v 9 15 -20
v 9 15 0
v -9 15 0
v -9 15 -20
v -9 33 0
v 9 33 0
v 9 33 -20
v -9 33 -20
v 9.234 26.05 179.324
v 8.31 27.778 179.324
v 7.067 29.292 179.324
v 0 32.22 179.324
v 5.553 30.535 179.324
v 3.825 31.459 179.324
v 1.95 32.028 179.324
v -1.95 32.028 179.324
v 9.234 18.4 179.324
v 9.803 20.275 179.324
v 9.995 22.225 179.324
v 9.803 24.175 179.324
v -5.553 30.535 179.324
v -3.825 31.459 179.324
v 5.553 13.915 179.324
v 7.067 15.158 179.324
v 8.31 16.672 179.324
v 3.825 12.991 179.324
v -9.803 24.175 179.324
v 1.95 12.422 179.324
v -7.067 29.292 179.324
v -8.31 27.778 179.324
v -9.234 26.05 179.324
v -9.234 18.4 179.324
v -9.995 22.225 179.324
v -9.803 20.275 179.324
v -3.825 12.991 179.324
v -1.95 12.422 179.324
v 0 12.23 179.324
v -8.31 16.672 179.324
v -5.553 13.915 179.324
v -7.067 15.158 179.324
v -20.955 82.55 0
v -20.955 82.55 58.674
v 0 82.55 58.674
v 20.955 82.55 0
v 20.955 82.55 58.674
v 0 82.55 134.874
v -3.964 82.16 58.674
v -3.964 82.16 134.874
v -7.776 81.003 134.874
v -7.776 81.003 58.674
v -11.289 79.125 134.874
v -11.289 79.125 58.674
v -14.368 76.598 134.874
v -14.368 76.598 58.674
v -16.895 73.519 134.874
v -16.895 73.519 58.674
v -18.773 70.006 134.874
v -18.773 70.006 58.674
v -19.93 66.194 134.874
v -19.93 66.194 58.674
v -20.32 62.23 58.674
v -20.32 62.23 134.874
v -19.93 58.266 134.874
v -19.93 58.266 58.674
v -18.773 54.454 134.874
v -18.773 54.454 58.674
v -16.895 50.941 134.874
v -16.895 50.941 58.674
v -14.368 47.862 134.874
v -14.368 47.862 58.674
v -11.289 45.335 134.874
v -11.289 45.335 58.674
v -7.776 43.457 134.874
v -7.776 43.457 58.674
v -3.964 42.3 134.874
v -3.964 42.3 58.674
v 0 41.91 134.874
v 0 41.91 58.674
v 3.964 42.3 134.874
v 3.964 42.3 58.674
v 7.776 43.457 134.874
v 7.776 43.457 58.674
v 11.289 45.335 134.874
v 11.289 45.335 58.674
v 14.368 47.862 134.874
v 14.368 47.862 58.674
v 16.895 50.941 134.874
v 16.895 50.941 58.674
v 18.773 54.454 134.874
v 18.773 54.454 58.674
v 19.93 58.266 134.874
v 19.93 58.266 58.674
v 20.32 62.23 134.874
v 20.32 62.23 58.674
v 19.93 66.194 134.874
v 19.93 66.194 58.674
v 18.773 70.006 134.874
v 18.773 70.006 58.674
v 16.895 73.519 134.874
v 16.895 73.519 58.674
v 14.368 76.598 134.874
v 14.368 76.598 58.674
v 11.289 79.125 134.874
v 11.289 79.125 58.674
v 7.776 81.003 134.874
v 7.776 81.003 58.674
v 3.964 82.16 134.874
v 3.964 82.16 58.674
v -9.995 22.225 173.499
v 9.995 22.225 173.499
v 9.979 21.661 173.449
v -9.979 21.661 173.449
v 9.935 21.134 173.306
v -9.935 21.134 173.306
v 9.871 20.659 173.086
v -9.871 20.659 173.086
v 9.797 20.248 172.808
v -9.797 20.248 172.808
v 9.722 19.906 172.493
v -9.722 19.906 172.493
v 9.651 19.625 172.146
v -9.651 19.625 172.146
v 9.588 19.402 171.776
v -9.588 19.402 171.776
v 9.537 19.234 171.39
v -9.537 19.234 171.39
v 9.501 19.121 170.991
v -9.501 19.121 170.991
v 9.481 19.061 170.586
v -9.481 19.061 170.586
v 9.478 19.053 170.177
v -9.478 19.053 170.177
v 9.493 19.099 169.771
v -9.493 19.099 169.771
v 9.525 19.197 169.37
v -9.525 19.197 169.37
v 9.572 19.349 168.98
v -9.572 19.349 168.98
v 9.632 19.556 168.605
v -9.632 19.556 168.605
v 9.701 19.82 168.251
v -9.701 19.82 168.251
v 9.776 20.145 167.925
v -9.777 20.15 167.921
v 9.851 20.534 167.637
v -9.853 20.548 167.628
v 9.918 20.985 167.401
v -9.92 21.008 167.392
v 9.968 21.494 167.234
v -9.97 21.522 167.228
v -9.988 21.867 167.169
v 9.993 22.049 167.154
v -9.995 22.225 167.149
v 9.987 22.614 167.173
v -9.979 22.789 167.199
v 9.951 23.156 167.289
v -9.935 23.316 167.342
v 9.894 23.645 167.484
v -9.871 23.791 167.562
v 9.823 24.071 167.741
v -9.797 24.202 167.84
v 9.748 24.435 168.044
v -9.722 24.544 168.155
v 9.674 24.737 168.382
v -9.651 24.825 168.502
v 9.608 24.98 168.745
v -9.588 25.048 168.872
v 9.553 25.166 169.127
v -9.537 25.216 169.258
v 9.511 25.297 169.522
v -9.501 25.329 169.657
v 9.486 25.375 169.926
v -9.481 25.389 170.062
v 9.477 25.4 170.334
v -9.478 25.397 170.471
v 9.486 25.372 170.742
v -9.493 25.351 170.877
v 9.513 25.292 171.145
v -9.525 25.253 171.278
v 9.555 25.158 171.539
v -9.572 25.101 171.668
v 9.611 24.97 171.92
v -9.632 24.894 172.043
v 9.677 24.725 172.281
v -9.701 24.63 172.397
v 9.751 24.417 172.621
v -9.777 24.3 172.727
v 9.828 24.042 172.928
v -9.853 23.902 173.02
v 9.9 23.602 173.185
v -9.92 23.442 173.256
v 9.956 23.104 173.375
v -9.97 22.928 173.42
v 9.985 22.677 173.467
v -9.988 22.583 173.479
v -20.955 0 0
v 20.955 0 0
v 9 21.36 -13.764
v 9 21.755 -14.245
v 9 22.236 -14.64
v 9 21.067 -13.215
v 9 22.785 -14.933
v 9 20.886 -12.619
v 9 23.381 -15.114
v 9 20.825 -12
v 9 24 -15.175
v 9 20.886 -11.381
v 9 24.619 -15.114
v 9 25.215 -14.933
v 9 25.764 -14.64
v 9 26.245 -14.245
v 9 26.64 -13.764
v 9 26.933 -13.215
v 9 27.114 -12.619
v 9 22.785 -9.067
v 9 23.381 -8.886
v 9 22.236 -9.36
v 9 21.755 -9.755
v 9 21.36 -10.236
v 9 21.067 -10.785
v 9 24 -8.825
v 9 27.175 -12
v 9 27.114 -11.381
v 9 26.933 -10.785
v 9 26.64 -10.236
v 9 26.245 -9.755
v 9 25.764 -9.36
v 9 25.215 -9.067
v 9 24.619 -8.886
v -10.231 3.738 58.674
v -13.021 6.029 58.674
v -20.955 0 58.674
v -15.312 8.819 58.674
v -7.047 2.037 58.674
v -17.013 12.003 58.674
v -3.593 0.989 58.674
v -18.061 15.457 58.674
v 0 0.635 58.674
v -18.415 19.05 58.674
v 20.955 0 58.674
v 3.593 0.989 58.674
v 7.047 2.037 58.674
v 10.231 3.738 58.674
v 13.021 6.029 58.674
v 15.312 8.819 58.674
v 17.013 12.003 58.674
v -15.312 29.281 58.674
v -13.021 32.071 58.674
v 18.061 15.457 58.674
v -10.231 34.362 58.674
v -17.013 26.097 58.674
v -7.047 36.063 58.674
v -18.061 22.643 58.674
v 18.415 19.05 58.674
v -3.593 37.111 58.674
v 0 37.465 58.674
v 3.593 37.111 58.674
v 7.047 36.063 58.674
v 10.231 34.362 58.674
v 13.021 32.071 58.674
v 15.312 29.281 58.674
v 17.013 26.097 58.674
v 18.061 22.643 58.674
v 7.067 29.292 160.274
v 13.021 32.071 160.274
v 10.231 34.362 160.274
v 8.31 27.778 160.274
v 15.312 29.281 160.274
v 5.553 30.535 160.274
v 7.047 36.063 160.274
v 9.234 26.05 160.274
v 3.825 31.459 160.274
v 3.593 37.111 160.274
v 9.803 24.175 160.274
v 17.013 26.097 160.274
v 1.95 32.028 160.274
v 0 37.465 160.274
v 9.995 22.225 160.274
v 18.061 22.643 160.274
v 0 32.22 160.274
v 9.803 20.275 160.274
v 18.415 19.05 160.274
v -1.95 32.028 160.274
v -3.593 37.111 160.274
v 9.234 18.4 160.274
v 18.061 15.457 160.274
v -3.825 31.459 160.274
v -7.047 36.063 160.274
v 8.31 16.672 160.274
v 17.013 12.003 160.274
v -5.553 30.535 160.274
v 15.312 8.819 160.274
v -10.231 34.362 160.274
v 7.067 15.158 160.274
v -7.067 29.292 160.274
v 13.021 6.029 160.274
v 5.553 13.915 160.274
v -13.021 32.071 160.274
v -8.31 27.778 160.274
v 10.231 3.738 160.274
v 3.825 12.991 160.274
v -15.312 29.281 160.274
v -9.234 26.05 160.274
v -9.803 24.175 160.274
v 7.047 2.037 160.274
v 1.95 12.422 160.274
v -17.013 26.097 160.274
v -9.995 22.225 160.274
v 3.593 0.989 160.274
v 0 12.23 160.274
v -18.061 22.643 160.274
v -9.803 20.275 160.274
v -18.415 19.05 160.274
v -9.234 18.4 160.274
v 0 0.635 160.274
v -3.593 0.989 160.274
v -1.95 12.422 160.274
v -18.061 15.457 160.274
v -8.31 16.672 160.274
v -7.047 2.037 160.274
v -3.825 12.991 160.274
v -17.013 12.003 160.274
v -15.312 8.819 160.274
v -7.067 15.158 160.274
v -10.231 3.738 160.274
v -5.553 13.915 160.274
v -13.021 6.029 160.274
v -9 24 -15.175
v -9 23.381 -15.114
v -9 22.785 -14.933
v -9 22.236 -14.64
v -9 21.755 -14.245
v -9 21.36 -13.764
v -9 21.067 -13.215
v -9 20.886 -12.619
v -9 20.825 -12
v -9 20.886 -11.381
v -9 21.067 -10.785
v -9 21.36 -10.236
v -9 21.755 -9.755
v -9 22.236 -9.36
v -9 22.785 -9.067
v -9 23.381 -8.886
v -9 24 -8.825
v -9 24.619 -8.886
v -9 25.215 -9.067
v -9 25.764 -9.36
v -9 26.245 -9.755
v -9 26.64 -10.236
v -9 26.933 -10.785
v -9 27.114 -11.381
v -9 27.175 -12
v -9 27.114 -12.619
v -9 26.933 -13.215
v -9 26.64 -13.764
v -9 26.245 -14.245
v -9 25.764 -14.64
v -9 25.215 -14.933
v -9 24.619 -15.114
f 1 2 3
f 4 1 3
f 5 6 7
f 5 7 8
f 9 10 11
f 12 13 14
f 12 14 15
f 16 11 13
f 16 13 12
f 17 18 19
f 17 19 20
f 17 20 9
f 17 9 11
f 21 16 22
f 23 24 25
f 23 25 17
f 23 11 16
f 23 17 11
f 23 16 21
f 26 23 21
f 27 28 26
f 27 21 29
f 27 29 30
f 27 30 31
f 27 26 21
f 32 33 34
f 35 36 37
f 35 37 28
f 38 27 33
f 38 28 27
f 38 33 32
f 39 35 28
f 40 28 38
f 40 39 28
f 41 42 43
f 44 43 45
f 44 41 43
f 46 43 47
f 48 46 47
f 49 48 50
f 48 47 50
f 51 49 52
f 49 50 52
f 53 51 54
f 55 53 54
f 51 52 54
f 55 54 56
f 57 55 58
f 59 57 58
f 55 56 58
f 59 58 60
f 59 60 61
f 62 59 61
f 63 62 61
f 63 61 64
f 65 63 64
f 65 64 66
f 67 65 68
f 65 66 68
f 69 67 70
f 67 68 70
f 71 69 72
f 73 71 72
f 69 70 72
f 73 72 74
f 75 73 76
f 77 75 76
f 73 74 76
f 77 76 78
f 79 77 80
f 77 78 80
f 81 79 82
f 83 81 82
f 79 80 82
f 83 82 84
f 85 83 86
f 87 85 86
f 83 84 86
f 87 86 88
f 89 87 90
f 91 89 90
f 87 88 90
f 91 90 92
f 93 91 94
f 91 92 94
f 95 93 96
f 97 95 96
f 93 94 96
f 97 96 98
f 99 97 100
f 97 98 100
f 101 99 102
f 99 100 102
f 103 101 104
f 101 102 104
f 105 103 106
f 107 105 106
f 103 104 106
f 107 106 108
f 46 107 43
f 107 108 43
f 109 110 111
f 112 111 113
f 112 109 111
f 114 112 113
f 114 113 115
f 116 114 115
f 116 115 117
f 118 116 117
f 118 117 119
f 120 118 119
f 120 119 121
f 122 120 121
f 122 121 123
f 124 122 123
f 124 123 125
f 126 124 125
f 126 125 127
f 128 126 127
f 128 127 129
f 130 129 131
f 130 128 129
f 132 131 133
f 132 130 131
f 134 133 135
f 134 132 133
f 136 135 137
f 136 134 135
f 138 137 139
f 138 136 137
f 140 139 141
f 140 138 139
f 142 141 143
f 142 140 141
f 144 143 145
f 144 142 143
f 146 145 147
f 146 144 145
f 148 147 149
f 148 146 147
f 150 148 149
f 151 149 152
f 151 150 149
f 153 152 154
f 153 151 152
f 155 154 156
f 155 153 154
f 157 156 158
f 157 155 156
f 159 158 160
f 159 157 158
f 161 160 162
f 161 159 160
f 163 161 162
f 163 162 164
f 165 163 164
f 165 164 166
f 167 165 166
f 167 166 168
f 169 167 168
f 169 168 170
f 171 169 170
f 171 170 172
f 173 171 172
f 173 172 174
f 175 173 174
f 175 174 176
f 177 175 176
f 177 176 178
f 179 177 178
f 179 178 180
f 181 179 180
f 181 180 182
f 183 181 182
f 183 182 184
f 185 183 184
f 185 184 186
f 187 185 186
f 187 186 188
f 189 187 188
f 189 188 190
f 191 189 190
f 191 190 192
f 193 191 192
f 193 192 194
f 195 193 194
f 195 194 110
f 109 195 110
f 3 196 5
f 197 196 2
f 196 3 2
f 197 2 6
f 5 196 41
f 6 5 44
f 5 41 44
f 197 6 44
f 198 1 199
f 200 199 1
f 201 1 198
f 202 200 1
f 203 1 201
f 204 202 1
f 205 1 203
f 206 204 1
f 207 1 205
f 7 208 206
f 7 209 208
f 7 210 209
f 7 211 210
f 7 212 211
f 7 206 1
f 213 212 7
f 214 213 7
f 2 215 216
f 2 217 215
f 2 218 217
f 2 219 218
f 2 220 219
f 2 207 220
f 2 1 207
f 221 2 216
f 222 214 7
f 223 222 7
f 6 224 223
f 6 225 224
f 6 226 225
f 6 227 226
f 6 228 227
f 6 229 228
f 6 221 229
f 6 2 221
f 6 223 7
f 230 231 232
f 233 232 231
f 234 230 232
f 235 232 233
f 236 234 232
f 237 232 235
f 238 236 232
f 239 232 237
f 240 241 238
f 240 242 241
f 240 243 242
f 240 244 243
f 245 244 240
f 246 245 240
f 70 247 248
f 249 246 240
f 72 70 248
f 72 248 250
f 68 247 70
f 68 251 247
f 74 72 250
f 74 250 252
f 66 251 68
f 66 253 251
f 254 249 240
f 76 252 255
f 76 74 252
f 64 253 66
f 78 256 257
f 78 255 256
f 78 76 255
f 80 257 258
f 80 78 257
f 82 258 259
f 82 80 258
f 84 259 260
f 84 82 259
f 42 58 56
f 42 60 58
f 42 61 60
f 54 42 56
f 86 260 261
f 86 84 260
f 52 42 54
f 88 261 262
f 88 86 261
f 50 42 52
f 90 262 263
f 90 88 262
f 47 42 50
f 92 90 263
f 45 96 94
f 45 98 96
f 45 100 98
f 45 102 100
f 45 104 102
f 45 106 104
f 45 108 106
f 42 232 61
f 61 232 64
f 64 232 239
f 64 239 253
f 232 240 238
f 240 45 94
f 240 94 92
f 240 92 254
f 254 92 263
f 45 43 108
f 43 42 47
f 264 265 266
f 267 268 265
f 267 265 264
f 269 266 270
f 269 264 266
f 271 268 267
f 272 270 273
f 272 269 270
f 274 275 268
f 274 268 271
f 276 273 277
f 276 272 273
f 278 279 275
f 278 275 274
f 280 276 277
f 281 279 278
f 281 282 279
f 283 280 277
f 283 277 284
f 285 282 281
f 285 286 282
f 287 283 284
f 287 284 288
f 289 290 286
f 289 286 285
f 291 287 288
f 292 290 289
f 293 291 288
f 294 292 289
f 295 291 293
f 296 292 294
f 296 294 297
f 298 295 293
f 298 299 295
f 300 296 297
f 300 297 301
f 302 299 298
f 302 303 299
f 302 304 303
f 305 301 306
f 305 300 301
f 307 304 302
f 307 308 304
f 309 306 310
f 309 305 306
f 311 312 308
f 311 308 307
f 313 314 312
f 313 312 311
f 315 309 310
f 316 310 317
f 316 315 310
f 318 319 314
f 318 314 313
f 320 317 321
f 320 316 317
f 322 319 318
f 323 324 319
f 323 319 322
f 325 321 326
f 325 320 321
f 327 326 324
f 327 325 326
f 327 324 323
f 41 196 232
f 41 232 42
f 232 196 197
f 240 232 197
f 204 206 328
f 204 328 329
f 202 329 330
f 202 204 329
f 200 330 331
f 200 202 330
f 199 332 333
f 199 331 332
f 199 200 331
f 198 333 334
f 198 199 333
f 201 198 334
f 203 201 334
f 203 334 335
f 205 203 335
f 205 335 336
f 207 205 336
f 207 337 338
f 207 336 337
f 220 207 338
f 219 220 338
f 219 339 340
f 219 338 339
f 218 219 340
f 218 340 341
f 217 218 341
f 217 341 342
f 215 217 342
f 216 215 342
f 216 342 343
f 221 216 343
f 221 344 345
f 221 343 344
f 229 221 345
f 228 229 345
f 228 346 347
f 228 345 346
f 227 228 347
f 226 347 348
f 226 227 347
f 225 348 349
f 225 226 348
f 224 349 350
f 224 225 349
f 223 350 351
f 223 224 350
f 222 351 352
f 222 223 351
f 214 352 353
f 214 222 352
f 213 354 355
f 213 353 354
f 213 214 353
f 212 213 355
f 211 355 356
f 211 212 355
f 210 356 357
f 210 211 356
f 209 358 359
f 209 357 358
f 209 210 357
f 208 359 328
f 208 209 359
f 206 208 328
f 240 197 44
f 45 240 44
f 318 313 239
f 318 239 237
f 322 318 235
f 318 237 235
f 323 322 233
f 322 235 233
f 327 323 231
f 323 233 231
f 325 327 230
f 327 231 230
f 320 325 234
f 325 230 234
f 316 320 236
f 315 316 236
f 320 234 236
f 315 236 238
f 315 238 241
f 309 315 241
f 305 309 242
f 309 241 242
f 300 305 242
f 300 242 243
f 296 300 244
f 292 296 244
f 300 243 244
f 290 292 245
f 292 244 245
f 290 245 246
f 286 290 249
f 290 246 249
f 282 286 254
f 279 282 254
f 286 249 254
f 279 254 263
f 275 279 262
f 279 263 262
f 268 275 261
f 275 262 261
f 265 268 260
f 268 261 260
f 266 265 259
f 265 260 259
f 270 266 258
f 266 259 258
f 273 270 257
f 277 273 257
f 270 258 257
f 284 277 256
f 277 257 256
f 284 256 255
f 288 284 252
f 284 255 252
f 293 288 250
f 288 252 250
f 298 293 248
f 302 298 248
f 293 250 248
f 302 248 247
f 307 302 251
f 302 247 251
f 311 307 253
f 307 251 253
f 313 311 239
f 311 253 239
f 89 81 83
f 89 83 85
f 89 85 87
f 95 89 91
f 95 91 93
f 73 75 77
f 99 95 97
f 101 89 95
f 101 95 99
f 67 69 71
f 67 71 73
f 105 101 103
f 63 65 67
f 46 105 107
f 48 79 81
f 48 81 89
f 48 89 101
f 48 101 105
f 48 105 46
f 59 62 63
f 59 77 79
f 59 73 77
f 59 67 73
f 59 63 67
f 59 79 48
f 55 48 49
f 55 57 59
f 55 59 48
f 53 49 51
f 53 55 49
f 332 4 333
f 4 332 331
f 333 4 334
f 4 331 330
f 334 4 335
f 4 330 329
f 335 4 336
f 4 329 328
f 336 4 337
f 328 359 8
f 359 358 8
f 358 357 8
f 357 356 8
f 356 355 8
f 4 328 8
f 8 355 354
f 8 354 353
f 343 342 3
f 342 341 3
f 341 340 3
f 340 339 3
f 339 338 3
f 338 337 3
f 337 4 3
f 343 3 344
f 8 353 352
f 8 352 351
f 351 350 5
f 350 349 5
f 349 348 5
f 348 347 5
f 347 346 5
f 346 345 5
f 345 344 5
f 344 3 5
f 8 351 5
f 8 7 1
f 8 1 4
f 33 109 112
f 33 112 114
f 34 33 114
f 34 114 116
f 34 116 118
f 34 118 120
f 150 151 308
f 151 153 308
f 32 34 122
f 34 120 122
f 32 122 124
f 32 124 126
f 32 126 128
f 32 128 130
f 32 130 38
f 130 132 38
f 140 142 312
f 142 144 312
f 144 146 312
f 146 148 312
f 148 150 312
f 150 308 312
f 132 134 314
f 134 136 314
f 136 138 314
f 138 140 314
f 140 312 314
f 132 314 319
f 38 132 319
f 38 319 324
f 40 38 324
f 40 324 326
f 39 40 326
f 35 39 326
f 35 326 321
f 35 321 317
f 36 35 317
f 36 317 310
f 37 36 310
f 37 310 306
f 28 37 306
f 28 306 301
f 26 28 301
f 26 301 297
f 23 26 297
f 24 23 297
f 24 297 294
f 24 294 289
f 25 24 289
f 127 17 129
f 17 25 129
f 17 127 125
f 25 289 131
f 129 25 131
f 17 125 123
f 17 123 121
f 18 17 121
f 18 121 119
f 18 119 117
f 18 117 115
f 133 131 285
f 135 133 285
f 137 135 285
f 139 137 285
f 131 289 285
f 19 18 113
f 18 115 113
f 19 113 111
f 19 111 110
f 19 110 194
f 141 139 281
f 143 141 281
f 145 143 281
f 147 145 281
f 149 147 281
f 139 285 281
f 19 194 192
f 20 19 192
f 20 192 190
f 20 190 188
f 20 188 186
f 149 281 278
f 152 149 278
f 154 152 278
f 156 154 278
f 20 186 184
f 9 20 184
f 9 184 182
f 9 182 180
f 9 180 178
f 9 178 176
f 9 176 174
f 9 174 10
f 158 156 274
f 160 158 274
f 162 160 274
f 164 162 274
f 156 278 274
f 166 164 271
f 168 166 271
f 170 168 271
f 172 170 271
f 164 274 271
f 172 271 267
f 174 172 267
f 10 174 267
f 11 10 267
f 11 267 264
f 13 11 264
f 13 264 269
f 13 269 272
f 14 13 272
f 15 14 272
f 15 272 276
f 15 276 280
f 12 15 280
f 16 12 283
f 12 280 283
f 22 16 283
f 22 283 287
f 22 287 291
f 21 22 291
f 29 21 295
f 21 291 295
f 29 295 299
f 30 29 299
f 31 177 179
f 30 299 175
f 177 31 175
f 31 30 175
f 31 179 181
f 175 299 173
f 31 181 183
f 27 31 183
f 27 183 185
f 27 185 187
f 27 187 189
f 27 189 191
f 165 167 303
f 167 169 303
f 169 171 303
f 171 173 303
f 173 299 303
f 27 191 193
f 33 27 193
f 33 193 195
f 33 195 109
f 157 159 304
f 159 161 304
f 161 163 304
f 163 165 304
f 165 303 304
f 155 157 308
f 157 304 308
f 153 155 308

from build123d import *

# Parameters (mm, degrees)
SKETCH1_W               = 41.91
SKETCH1_H               = 82.55
BOSS_EXTRUDE1_DEPTH     = 58.674
SKETCH2_R               = 20.32
BOSS_EXTRUDE2_DEPTH     = 76.2
SKETCH3_R               = 18.415
BOSS_EXTRUDE3_DEPTH     = 101.6
SKETCH4_R               = 9.9949
BOSS_EXTRUDE4_DEPTH     = 19.05
CUT_EXTRUDE1_DEPTH      = 19.05
CUT_EXTRUDE1_DEPTH_BACK = 19.05
SKETCH6_R               = 3.175
SKETCH7_W               = 18
SKETCH7_H               = 18
BOSS_EXTRUDE5_DEPTH     = 20
CUT_EXTRUDE2_DEPTH      = 20
CUT_EXTRUDE2_DEPTH_BACK = 20
SKETCH8_R               = 3.175


with BuildPart() as part:
    # Sketch1 → Boss-Extrude1 (new body)
    with BuildSketch(Plane.XY):
        with Locations((0, 41.275)):
            Rectangle(SKETCH1_W, SKETCH1_H)
    extrude(amount=BOSS_EXTRUDE1_DEPTH)

    # Sketch2 → Boss-Extrude2 (add)
    with BuildSketch(Plane.XY.offset(58.674)):
        with Locations((0, 62.23)):
            Circle(SKETCH2_R)
    extrude(amount=BOSS_EXTRUDE2_DEPTH)

    # Sketch3 → Boss-Extrude3 (add)
    with BuildSketch(Plane.XY.offset(58.674)):
        with Locations((0, 19.05)):
            Circle(SKETCH3_R)
    extrude(amount=BOSS_EXTRUDE3_DEPTH)

    # Sketch4 → Boss-Extrude4 (add)
    with BuildSketch(Plane.XY.offset(160.274)):
        with Locations((0, 22.225)):
            Circle(SKETCH4_R)
    extrude(amount=BOSS_EXTRUDE4_DEPTH)

    # Sketch6 → Cut-Extrude1 (cut, two sides: drawn at the far end of the back side and taken through both)
    with BuildSketch(Plane(origin=(0, 0, 0), x_dir=(0, 0, -1), z_dir=(1, 0, 0)).offset(-CUT_EXTRUDE1_DEPTH_BACK)):
        with Locations((-170.324, 22.225)):
            Circle(SKETCH6_R)
    extrude(amount=CUT_EXTRUDE1_DEPTH + CUT_EXTRUDE1_DEPTH_BACK, mode=Mode.SUBTRACT)

    # Sketch7 → Boss-Extrude5 (add)
    with BuildSketch(Plane(origin=(0, 0, 0), x_dir=(-1, 0, 0), z_dir=(0, 0, -1))):
        with Locations((0, 24)):
            Rectangle(SKETCH7_W, SKETCH7_H)
    extrude(amount=BOSS_EXTRUDE5_DEPTH)

    # Sketch8 → Cut-Extrude2 (cut, two sides: drawn at the far end of the back side and taken through both)
    with BuildSketch(Plane.ZY.offset(9).offset(-CUT_EXTRUDE2_DEPTH_BACK)):
        with Locations((-12, 24)):
            Circle(SKETCH8_R)
    extrude(amount=CUT_EXTRUDE2_DEPTH + CUT_EXTRUDE2_DEPTH_BACK, mode=Mode.SUBTRACT)


solid = part.part
